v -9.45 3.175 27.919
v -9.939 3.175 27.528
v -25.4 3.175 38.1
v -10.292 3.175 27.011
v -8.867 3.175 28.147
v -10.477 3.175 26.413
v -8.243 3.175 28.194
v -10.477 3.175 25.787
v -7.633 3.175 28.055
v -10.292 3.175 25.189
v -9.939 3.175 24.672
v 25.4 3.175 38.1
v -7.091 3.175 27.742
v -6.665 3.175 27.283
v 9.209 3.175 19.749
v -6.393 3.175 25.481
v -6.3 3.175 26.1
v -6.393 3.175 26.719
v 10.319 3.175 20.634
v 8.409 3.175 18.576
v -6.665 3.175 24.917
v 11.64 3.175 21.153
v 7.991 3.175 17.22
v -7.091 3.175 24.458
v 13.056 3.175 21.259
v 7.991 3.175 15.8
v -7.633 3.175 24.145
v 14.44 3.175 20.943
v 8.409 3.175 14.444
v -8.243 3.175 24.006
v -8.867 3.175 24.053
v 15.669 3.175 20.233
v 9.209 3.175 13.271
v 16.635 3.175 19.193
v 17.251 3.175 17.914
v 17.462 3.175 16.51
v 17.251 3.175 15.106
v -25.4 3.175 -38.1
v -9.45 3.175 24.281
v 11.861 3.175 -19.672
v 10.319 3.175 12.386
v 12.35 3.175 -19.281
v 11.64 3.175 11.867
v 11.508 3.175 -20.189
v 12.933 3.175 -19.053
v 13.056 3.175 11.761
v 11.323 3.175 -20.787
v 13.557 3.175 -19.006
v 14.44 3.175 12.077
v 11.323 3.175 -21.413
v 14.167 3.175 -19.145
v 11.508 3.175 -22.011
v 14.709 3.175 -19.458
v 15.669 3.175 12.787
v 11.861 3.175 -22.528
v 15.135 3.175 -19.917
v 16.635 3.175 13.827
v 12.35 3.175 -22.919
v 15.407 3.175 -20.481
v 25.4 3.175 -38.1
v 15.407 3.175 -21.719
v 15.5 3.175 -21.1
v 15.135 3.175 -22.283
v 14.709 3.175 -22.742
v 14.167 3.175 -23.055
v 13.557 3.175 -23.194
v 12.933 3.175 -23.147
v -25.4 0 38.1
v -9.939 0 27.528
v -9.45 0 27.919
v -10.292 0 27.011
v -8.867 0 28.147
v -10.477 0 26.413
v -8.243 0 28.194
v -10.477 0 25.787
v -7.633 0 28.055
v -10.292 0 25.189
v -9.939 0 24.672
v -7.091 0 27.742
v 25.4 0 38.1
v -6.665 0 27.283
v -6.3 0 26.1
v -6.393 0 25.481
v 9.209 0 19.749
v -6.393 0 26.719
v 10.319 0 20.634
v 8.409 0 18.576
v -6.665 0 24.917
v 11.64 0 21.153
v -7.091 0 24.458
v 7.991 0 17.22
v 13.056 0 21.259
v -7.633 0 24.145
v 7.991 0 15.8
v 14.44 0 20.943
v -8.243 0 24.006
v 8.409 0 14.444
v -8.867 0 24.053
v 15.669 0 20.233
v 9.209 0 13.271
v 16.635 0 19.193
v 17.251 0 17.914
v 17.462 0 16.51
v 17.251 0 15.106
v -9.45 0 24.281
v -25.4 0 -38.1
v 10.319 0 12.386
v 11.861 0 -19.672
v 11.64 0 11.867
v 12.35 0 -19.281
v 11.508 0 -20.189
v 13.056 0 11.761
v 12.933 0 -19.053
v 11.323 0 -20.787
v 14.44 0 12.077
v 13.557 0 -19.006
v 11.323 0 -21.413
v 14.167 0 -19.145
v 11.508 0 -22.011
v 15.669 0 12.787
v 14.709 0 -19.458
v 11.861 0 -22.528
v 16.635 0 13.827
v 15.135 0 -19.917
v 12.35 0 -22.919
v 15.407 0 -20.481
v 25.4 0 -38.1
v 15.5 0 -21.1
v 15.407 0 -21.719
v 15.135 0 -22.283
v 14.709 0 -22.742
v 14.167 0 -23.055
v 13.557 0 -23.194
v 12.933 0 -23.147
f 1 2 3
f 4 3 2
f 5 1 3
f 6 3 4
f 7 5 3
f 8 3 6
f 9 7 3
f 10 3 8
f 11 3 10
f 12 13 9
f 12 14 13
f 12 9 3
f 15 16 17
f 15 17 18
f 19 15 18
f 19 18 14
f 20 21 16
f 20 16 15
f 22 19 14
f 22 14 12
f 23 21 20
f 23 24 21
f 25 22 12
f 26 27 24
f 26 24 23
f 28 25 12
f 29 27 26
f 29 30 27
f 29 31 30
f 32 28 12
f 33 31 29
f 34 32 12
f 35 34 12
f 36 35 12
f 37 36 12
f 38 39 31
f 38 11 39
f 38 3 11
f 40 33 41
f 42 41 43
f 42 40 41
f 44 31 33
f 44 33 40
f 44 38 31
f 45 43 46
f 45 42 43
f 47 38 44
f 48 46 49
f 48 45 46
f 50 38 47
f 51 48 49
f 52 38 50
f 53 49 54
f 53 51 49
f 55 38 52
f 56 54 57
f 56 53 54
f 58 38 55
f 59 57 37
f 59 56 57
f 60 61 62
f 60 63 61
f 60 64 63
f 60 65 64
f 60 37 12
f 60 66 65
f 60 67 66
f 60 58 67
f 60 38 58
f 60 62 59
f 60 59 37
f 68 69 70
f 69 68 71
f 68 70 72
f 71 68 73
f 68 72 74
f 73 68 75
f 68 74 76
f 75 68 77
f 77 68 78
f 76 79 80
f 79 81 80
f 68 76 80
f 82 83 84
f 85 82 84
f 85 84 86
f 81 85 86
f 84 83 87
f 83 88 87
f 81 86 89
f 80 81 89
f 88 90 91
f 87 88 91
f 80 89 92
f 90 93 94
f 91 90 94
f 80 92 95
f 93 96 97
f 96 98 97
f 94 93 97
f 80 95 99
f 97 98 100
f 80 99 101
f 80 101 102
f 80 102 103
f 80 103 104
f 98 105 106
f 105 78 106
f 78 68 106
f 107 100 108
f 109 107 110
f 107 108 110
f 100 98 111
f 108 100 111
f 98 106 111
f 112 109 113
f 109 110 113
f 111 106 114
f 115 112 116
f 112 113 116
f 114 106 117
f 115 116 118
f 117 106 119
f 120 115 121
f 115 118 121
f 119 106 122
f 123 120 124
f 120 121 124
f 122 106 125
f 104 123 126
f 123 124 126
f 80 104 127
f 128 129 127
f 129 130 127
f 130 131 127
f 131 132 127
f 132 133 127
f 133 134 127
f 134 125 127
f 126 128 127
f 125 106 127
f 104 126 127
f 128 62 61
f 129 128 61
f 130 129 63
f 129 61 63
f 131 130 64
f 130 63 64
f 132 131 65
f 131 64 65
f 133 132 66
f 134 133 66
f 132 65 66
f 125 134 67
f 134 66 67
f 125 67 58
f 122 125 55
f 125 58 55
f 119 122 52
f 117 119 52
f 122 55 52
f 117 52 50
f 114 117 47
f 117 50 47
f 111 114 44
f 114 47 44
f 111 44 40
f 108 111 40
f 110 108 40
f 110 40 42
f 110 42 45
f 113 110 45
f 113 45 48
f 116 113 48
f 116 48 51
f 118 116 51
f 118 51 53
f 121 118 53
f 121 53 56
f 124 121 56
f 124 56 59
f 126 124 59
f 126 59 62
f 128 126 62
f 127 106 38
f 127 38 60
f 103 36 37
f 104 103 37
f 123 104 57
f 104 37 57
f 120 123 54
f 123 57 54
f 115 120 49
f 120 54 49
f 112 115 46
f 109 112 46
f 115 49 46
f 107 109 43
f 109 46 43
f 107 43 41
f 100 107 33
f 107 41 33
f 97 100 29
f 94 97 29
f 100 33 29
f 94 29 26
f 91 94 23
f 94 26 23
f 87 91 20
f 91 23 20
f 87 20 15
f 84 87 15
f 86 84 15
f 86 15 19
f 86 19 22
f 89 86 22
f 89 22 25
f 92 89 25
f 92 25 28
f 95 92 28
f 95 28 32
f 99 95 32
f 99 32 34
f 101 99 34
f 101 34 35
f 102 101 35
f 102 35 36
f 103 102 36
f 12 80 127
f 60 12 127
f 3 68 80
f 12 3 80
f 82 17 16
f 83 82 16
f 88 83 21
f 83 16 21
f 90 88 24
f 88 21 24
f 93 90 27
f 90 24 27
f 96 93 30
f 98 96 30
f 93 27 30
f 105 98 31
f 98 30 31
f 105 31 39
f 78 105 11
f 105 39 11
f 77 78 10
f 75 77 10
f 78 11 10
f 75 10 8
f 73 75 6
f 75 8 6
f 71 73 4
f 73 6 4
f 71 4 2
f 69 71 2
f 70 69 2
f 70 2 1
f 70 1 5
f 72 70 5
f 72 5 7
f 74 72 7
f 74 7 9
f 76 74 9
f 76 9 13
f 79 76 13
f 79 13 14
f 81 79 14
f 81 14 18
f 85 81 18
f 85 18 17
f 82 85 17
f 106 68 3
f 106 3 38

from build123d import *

# Parameters (mm, degrees)
SKETCH1_W           = 50.8
SKETCH1_H           = 76.2
BOSS_EXTRUDE1_DEPTH = 3.175
SKETCH2_R           = 4.7625
CUT_EXTRUDE1_DEPTH  = 4.175
SKETCH3_R           = 2.1
CUT_EXTRUDE2_DEPTH  = 4.175


with BuildPart() as part:
    # Sketch1 → Boss-Extrude1 (new body)
    with BuildSketch(Plane(origin=(0, 0, 0), x_dir=(1, 0, 0), z_dir=(0, 1, 0))):
        Rectangle(SKETCH1_W, SKETCH1_H)
    extrude(amount=BOSS_EXTRUDE1_DEPTH)

    # Sketch2 → Cut-Extrude1 (cut, through all)
    with BuildSketch(Plane(origin=(0, 3.175, 0), x_dir=(1, 0, 0), z_dir=(0, 1, 0))):
        with Locations((12.7, -16.51)):
            Circle(SKETCH2_R)
    extrude(amount=-CUT_EXTRUDE1_DEPTH, mode=Mode.SUBTRACT)

    # Sketch3 → Cut-Extrude2 (cut, through all)
    with BuildSketch(Plane(origin=(0, 3.175, 0), x_dir=(1, 0, 0), z_dir=(0, 1, 0))):
        with Locations((13.4, 21.1)):
            Circle(SKETCH3_R)
        with Locations((-8.4, -26.1)):
            Circle(SKETCH3_R)
    extrude(amount=-CUT_EXTRUDE2_DEPTH, mode=Mode.SUBTRACT)


solid = part.part
